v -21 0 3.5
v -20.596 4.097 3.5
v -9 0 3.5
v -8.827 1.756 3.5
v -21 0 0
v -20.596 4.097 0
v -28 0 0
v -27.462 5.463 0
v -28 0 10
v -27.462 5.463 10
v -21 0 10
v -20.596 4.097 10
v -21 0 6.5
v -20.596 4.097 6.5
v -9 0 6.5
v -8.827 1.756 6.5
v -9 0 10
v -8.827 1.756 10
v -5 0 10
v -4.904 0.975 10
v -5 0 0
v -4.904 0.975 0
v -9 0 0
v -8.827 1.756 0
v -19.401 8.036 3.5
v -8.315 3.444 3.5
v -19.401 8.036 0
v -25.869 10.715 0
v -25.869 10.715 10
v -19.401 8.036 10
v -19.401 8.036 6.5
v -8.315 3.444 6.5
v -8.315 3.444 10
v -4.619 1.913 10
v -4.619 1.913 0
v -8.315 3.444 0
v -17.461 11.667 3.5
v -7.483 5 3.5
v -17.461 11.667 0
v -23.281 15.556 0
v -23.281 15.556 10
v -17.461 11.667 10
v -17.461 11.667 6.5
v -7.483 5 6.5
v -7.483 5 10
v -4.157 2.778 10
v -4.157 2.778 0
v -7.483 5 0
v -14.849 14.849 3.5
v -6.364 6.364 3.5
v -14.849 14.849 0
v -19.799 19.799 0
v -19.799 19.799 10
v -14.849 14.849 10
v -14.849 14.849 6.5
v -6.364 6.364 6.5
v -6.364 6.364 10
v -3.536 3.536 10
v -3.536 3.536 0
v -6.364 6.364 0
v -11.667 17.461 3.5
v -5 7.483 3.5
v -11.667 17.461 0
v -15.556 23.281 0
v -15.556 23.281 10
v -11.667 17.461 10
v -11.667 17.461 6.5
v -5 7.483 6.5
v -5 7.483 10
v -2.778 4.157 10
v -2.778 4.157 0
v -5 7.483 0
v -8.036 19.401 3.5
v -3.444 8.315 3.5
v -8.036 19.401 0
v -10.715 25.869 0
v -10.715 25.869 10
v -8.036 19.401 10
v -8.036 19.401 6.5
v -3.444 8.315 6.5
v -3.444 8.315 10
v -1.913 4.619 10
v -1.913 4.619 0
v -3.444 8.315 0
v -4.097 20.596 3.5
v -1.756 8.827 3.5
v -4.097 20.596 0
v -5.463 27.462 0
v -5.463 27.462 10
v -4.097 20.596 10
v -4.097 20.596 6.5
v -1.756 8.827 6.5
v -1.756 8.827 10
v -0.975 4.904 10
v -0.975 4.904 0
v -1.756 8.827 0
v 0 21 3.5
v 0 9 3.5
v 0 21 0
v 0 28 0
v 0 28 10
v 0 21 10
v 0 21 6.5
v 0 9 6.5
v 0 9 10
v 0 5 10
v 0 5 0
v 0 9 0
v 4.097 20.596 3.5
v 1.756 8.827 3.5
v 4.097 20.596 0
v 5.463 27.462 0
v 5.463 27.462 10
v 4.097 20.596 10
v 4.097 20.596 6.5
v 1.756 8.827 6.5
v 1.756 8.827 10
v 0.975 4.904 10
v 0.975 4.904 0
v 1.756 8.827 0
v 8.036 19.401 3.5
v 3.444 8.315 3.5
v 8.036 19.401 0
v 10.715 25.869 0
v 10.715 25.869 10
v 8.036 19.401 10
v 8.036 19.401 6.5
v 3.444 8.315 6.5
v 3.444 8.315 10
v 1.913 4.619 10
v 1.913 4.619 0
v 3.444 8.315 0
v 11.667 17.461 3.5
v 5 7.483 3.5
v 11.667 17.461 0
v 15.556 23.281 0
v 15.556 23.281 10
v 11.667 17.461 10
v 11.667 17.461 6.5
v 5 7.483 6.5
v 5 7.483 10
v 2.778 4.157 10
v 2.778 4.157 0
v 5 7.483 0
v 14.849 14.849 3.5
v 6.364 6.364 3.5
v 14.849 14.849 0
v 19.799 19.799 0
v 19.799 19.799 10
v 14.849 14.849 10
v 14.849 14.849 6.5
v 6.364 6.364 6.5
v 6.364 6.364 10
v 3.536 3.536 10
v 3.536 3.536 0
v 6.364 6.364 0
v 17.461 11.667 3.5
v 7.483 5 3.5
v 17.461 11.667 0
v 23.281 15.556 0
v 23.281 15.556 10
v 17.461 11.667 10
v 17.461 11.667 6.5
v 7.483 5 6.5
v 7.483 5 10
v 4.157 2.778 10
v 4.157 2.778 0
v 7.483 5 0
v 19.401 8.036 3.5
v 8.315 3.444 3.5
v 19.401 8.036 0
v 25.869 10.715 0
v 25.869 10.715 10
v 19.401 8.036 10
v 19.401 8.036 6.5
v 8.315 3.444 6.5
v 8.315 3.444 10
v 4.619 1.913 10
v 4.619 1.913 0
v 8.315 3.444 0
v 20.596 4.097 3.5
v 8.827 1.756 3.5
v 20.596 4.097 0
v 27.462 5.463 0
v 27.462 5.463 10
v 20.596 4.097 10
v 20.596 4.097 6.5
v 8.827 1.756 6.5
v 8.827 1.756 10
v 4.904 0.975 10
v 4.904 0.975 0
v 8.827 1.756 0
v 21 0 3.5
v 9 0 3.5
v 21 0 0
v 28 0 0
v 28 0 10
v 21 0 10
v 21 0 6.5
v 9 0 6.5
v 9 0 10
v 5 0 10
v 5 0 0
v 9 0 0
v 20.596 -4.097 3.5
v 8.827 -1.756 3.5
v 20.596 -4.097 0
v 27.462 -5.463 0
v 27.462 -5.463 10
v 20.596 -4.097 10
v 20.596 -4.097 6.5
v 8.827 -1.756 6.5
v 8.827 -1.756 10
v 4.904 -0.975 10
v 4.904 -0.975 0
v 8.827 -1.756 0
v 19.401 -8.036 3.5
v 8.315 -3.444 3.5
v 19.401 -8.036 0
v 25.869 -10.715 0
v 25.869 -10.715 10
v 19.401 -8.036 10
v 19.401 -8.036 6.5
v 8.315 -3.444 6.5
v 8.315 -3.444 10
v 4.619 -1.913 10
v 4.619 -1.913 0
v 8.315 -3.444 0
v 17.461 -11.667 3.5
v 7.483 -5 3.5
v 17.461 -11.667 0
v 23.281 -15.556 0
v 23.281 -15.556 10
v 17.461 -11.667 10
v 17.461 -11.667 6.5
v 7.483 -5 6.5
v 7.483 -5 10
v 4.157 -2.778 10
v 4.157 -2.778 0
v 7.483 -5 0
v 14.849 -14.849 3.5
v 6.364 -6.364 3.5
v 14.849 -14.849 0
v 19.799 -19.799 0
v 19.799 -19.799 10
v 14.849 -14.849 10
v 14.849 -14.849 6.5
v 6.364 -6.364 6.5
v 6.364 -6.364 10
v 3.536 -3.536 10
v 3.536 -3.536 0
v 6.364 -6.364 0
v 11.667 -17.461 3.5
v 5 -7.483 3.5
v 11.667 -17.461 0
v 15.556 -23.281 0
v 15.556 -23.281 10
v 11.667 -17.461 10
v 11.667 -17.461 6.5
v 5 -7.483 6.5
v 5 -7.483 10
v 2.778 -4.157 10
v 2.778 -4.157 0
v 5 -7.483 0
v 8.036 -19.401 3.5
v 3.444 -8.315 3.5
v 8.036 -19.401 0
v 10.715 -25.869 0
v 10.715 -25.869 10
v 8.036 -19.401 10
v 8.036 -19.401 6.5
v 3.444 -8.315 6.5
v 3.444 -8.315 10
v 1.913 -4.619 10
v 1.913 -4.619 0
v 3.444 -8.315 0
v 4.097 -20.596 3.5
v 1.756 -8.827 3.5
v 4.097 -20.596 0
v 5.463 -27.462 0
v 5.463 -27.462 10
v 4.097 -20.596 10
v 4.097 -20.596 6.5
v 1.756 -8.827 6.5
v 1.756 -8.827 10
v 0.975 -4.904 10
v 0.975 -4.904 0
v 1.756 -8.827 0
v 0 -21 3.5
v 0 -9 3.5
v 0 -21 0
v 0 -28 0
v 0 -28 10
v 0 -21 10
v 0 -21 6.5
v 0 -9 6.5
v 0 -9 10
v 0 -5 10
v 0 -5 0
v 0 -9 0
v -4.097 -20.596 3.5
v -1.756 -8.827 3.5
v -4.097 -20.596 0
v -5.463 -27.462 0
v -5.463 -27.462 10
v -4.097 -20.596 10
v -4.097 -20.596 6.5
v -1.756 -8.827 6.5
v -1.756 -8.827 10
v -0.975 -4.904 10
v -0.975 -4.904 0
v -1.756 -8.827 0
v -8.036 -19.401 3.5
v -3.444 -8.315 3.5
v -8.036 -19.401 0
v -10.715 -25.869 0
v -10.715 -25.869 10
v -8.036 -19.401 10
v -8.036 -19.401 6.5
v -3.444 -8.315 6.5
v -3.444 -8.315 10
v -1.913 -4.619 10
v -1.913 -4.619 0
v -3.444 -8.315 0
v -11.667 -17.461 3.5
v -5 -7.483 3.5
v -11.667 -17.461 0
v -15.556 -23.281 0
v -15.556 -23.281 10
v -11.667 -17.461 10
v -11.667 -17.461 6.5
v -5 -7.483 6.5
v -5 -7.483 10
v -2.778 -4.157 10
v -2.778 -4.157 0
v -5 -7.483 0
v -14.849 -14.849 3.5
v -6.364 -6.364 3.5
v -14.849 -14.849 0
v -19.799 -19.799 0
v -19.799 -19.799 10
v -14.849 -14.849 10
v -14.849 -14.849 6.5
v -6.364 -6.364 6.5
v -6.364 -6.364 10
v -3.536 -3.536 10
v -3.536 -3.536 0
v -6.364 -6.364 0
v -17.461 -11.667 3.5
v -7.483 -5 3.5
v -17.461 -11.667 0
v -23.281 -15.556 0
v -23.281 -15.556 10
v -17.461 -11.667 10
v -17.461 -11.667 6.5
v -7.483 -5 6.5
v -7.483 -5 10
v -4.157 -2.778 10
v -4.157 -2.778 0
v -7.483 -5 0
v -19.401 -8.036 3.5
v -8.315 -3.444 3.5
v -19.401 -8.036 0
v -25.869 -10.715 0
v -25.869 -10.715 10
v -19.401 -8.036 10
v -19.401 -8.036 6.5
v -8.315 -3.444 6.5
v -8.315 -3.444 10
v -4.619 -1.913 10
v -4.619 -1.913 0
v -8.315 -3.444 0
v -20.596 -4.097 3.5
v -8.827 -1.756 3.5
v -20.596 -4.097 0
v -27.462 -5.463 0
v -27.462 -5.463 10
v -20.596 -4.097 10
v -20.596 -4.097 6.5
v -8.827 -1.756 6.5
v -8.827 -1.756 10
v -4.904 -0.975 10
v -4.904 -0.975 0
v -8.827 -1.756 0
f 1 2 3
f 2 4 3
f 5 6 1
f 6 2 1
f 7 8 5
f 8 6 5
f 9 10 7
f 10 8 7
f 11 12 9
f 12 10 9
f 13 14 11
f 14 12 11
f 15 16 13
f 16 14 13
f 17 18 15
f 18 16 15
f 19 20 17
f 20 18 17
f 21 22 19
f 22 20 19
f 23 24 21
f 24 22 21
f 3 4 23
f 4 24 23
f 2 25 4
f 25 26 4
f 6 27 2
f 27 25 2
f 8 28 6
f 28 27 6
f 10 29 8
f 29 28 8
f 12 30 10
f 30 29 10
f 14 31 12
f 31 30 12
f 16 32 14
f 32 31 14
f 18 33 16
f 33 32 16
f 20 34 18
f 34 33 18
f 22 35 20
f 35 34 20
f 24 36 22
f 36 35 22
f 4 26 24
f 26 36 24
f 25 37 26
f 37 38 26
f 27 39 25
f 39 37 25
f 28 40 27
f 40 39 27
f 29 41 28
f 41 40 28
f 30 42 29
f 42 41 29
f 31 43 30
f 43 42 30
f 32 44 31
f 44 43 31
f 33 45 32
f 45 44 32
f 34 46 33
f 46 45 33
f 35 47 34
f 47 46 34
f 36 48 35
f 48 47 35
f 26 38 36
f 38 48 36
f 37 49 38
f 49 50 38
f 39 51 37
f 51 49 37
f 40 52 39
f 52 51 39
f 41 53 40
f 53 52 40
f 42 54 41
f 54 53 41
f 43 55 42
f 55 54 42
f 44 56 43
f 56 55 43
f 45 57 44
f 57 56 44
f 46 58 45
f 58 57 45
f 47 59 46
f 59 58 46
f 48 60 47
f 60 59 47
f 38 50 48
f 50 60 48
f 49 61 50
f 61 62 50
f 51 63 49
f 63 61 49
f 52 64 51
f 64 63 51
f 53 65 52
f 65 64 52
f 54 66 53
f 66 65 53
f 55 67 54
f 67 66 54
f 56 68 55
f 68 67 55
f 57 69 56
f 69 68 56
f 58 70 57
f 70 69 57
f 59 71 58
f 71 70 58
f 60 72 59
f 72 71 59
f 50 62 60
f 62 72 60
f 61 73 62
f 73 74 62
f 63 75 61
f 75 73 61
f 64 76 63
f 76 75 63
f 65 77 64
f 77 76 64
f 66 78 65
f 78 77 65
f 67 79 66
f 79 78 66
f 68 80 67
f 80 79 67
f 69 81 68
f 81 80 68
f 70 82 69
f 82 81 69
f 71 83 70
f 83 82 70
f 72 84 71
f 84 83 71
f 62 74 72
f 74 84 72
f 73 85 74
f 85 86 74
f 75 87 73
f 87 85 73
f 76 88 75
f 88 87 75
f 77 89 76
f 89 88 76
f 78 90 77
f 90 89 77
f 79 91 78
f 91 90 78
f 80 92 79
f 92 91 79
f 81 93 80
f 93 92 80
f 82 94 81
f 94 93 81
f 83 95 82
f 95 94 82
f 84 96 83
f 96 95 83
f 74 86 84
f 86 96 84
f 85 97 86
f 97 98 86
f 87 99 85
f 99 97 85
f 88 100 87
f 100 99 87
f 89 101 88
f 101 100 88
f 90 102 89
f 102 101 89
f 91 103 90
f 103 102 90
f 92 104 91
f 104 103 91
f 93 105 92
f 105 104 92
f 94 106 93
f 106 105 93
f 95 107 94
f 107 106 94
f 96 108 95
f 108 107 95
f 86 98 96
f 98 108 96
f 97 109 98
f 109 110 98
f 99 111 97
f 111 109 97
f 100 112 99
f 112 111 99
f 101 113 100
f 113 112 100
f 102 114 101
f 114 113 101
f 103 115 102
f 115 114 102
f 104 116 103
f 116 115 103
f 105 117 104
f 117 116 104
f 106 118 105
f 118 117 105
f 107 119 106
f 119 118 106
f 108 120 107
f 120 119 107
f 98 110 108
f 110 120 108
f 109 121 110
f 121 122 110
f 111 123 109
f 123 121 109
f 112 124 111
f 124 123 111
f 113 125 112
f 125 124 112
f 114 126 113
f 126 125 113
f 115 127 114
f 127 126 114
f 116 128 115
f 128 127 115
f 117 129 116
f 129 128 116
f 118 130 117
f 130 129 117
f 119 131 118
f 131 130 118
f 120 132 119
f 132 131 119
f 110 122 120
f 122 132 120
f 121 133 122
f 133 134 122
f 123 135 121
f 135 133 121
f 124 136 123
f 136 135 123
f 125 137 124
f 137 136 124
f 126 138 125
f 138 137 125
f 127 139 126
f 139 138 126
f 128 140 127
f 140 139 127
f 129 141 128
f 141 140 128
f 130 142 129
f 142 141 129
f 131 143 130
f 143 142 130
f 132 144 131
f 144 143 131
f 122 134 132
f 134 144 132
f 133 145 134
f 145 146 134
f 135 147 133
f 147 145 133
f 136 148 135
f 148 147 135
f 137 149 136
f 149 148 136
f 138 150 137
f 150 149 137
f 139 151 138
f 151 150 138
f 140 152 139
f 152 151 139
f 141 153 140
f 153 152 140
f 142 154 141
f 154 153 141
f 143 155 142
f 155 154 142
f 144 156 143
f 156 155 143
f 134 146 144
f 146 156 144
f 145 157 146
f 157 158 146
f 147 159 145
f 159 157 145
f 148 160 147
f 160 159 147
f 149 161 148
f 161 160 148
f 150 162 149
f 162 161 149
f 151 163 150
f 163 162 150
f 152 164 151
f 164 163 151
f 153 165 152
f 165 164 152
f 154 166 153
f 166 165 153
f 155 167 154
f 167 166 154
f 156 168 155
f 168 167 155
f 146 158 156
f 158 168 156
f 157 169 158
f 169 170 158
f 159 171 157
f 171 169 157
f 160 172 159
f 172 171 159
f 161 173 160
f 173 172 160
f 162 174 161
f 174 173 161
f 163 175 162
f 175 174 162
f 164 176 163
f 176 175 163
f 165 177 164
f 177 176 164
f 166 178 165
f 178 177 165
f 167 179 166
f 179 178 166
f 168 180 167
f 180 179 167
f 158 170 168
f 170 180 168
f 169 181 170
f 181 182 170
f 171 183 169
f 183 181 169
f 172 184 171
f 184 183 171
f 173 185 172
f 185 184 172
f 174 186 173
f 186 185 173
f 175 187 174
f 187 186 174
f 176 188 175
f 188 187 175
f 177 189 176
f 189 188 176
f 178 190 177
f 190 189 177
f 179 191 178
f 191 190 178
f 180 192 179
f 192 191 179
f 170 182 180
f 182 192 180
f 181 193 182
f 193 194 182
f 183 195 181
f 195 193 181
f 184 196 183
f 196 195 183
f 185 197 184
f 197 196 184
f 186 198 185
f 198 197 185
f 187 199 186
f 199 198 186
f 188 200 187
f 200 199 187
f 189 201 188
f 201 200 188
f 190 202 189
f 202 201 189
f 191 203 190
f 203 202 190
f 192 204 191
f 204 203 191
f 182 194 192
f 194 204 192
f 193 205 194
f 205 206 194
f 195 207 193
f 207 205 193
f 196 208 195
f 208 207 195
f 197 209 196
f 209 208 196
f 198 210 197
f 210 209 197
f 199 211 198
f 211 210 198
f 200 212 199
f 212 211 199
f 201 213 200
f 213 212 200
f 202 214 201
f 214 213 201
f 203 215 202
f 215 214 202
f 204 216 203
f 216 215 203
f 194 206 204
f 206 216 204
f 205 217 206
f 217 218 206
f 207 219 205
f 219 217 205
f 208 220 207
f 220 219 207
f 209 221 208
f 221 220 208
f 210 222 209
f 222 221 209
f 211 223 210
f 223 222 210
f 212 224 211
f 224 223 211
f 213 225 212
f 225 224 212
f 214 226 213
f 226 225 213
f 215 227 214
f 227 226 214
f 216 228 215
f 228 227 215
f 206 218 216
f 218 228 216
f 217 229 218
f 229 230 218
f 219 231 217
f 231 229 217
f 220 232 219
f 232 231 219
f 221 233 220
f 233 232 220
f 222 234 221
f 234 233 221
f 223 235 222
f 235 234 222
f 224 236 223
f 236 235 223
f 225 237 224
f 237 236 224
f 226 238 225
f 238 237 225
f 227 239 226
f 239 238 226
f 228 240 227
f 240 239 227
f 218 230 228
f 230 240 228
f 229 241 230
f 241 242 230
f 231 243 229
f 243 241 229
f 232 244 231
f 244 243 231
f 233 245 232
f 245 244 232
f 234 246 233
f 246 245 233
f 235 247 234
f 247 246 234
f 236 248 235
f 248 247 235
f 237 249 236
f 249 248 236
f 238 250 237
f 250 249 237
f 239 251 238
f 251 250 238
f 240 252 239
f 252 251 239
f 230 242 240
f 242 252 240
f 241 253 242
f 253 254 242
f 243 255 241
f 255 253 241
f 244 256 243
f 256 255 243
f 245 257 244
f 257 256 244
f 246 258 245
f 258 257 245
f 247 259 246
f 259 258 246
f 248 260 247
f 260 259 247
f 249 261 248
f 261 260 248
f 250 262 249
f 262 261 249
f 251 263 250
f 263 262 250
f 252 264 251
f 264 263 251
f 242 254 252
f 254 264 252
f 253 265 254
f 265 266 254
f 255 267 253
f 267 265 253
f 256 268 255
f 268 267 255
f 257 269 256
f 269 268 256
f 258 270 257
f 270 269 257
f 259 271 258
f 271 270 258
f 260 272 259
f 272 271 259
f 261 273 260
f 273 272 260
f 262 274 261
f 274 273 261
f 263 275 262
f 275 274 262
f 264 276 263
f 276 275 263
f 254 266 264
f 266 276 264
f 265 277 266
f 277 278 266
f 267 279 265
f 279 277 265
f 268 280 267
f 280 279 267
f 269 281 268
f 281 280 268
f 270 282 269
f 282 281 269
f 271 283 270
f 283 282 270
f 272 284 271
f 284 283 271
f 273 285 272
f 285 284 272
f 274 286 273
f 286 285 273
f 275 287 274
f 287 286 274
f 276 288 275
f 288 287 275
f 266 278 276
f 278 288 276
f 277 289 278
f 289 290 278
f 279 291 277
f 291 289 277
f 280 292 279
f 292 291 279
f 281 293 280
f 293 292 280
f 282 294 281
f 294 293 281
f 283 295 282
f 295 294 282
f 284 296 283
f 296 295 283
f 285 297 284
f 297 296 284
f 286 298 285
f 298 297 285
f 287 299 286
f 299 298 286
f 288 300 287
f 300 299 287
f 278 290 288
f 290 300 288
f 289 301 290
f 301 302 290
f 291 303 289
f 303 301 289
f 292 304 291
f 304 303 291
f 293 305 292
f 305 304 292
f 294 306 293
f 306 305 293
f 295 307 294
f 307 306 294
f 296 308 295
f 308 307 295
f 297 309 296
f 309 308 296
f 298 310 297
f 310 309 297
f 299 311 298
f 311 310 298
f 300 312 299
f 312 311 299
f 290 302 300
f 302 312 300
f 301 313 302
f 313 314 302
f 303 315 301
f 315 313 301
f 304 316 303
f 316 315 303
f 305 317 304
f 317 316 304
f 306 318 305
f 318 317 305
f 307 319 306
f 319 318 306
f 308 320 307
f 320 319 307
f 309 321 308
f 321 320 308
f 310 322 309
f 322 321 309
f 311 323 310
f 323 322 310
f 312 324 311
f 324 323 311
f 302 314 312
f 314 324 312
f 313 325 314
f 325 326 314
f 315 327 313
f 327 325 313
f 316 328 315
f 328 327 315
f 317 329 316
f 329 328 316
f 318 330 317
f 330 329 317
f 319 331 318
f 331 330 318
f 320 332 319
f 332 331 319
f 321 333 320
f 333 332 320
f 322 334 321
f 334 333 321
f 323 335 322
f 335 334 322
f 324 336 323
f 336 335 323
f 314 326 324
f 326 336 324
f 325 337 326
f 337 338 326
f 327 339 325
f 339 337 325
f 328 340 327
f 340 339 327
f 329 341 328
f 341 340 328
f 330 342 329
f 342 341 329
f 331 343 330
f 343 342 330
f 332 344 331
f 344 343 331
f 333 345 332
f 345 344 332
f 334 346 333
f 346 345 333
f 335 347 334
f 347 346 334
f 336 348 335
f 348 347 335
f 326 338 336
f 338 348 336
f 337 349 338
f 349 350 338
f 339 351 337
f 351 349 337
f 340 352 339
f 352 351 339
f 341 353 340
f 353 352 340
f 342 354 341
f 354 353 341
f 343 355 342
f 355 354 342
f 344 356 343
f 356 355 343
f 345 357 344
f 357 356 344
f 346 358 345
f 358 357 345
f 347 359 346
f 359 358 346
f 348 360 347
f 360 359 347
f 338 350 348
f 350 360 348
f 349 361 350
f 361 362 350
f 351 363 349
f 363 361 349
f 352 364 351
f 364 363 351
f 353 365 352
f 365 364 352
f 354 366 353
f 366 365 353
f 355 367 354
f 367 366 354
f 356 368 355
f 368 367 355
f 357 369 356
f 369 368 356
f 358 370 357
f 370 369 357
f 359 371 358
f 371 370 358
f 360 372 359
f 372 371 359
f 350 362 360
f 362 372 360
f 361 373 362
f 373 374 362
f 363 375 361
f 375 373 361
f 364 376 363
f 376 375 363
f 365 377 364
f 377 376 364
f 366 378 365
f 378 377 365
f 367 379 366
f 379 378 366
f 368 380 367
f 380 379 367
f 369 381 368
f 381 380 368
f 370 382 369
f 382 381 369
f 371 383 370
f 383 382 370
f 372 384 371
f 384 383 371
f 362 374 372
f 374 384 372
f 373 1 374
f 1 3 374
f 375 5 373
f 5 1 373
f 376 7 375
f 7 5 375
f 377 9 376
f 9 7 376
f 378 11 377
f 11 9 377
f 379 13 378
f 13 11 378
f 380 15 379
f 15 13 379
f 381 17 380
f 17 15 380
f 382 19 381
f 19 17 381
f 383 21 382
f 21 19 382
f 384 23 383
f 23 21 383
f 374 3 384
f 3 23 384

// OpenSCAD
$fn = 32;

// ----------------------------------------------------------------------
// Revolved part: handwheel R28
// ----------------------------------------------------------------------

// --- parameters (mm) ---
bore_r = 5;               // bore radius
rim_r = 28;               // rim radius
rim_w = 7;                // rim axial width
rim_t = 10;               // rim diameter height
hub_r = 9;                // hub radius
web_t = 3;                // web thickness
revolve_angle = 360;      // revolve sweep, degrees

bore_d = 2 * bore_r;
rim_d = 2 * rim_r;
hub_d = 2 * hub_r;

profile = [[5, 0], [9, 0], [9, 3.5], [21, 3.5], [21, 0], [28, 0], [28, 10], [21, 10], [21, 6.5], [9, 6.5], [9, 10], [5, 10]];  // primary outline, 12 points, counter clockwise

// --- the one profile operation ---
rotate_extrude(angle = revolve_angle) polygon(points = profile);
